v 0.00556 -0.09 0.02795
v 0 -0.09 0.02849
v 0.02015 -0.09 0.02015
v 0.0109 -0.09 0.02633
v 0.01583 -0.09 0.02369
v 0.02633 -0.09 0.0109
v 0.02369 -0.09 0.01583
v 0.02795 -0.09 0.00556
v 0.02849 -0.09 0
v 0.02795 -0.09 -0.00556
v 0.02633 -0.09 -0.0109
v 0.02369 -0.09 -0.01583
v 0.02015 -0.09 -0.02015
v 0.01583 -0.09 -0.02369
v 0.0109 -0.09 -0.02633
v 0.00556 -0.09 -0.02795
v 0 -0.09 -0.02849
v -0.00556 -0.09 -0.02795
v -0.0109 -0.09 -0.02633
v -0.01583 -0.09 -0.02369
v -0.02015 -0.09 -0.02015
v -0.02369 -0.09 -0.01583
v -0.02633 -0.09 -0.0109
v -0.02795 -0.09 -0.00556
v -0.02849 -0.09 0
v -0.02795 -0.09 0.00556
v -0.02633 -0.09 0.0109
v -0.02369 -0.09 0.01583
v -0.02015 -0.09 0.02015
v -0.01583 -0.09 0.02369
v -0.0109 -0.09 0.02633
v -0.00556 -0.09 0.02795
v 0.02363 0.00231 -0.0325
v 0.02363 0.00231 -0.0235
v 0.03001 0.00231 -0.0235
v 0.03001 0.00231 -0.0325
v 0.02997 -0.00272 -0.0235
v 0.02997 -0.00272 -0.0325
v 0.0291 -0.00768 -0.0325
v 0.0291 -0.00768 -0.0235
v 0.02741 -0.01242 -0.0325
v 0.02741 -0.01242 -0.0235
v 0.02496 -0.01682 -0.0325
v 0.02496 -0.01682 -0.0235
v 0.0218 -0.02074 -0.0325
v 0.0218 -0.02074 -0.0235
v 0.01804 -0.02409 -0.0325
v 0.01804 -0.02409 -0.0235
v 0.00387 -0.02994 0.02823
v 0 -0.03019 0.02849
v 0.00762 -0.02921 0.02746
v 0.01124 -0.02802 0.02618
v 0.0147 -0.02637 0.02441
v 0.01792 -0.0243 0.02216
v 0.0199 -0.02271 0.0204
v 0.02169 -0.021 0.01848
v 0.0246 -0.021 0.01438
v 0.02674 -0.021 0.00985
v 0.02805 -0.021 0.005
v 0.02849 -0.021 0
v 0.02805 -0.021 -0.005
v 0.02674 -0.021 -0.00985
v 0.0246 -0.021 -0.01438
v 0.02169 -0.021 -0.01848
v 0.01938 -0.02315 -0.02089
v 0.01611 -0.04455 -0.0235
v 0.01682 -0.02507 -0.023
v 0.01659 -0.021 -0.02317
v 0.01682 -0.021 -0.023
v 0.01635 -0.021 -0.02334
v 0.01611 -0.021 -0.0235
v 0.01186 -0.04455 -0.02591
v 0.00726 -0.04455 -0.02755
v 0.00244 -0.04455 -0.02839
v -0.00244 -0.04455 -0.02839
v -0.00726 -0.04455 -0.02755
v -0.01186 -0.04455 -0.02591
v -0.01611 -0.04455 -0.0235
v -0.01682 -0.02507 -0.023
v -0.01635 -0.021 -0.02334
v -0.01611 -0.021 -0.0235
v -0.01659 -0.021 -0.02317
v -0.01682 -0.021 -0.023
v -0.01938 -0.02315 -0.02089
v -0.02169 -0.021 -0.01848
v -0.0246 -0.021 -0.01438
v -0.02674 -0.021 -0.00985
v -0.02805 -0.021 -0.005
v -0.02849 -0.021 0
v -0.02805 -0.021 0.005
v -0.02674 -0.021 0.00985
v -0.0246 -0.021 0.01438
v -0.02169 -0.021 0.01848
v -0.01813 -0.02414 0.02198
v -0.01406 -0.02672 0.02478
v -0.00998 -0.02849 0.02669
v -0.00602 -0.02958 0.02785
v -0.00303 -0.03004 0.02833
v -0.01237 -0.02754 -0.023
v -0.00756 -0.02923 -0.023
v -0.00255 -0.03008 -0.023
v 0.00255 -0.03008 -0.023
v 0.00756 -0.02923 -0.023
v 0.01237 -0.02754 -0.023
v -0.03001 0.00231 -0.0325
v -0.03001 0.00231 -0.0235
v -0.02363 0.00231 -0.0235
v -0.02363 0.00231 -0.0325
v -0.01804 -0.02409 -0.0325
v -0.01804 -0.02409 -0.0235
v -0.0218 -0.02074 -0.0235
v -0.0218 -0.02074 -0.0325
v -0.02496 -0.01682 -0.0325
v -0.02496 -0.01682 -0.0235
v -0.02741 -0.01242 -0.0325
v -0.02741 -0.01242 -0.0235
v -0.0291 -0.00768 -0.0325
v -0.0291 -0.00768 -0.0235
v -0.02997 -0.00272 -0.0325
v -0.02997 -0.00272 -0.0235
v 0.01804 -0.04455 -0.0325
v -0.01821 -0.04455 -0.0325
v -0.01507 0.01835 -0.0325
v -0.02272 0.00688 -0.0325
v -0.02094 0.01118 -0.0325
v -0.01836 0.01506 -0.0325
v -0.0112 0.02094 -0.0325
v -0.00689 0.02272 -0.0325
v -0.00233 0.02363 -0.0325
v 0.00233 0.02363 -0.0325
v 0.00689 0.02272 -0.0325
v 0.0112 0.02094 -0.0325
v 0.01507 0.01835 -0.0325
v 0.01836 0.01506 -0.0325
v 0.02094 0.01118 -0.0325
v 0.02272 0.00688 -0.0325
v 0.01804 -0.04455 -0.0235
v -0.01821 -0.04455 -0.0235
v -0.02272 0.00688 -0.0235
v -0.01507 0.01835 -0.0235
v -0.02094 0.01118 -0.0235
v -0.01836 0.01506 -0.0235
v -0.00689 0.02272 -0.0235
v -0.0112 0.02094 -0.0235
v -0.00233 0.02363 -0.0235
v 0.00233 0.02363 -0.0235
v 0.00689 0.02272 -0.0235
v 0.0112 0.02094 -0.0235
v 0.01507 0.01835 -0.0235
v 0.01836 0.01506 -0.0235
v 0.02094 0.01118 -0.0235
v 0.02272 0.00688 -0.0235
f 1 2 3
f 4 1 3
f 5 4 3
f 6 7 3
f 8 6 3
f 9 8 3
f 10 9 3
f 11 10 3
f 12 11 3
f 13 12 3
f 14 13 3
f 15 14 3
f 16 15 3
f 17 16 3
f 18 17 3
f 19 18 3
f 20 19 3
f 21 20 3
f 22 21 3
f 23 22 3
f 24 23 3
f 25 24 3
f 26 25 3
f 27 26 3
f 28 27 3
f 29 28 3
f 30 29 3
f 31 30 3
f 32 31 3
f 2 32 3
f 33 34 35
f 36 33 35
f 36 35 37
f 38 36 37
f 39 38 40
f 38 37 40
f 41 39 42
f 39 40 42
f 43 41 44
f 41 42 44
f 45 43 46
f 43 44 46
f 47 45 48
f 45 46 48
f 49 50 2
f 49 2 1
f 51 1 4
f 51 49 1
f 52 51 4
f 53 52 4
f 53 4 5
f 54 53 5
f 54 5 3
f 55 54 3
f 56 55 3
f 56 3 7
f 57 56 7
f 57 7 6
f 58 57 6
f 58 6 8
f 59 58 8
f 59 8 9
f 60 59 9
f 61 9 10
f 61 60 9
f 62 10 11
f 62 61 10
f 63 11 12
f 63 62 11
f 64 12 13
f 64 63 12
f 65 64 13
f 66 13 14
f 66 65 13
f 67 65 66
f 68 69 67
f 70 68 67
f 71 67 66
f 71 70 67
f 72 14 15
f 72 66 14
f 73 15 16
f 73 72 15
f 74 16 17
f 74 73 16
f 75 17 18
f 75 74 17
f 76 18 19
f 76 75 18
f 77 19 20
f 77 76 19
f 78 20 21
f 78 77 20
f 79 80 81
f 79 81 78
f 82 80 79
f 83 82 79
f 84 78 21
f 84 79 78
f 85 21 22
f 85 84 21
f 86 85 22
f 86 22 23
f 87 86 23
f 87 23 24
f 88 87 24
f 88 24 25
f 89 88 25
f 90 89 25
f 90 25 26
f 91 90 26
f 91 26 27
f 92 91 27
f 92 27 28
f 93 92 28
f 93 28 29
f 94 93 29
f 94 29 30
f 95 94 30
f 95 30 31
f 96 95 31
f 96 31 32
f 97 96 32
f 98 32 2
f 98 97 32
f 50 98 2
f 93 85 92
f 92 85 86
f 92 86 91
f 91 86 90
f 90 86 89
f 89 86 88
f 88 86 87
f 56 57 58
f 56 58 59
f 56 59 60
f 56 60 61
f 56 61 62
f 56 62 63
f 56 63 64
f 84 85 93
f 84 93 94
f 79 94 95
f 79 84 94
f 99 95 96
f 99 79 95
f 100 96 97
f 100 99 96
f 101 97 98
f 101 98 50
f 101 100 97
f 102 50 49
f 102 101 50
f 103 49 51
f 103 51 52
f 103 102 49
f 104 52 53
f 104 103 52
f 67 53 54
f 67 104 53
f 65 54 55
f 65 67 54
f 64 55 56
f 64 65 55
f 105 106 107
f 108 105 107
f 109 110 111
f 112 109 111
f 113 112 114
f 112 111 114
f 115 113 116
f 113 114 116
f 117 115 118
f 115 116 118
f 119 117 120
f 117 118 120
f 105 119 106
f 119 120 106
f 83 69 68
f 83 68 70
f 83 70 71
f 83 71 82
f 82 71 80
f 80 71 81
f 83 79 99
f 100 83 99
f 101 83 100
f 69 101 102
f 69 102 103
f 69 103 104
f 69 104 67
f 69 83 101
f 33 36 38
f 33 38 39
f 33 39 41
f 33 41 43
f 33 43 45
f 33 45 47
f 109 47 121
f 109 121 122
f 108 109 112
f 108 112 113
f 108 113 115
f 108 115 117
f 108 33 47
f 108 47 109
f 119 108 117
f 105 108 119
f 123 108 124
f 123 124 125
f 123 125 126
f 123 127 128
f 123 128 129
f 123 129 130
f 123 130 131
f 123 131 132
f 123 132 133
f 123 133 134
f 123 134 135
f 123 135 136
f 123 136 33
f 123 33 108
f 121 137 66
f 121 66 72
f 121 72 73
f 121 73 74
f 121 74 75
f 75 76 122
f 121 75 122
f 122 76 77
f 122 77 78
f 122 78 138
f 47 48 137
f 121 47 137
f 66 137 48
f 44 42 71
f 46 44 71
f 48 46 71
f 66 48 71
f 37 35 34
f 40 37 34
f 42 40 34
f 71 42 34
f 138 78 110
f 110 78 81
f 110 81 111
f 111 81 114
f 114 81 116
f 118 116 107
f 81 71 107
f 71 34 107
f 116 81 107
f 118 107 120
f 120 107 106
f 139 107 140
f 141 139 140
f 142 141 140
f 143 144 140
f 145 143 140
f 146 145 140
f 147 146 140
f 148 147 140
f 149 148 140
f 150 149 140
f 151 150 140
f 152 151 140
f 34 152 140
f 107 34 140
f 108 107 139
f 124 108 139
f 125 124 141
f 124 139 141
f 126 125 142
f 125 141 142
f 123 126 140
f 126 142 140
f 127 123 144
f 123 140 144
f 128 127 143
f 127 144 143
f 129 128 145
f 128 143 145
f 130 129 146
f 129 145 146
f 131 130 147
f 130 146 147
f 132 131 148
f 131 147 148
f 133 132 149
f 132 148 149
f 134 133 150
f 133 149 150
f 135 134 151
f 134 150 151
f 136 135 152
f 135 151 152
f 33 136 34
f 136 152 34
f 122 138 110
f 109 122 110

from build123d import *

# Parameters (mm, degrees)
BOSS_EXTRUDE1_START     = -0.021
SKETCH1_R               = 0.028494157
BOSS_EXTRUDE1_DEPTH     = 0.069
BOSS_EXTRUDE2_START     = -0.0235
BOSS_EXTRUDE2_DEPTH     = 0.009
CUT_EXTRUDE1_DEPTH      = 1.100309452
CUT_EXTRUDE1_DEPTH_BACK = 0.023
SKETCH3_R               = 0.030190841


with BuildPart() as part:
    # Sketch1 → Boss-Extrude1 (new body)
    with BuildSketch(Plane(origin=(0, 0, 0), x_dir=(1, 0, 0), z_dir=(0, 1, 0)).offset(BOSS_EXTRUDE1_START)):
        with Locations(Location((0, 0, 0), (0, 0, 270))):
            Circle(SKETCH1_R)
    extrude(amount=-BOSS_EXTRUDE1_DEPTH)

    # Sketch2 → Boss-Extrude2 (add)
    with BuildSketch(Plane.XY.offset(BOSS_EXTRUDE2_START)):
        with BuildLine():
            Line((-0.030006367, 0.002313885), (-0.023629396, 0.002313885))
            ThreePointArc((-0.023629396, 0.002313885), (0, 0.023742418), (0.023629396, 0.002313885))
            Line((0.023629396, 0.002313885), (0.030006367, 0.002313885))
            ThreePointArc((0.030006367, 0.002313885), (0.02741159, -0.012423398), (0.01803999, -0.02408931))
            Line((0.01803999, -0.02408931), (0.01803999, -0.044550196))
            Line((0.01803999, -0.044550196), (-0.018210349, -0.044550196))
            Line((-0.018210349, -0.044550196), (-0.01803999, -0.02408931))
            ThreePointArc((-0.01803999, -0.02408931), (-0.02741159, -0.012423398), (-0.030006367, 0.002313885))
        make_face()
    extrude(amount=-BOSS_EXTRUDE2_DEPTH)

    # Sketch3 → Cut-Extrude1 (cut, two sides: drawn at the far end of the back side and taken through both)
    with BuildSketch(Plane.XY.offset(-CUT_EXTRUDE1_DEPTH_BACK)):
        Circle(SKETCH3_R)
    extrude(amount=CUT_EXTRUDE1_DEPTH + CUT_EXTRUDE1_DEPTH_BACK, mode=Mode.SUBTRACT)


solid = part.part
